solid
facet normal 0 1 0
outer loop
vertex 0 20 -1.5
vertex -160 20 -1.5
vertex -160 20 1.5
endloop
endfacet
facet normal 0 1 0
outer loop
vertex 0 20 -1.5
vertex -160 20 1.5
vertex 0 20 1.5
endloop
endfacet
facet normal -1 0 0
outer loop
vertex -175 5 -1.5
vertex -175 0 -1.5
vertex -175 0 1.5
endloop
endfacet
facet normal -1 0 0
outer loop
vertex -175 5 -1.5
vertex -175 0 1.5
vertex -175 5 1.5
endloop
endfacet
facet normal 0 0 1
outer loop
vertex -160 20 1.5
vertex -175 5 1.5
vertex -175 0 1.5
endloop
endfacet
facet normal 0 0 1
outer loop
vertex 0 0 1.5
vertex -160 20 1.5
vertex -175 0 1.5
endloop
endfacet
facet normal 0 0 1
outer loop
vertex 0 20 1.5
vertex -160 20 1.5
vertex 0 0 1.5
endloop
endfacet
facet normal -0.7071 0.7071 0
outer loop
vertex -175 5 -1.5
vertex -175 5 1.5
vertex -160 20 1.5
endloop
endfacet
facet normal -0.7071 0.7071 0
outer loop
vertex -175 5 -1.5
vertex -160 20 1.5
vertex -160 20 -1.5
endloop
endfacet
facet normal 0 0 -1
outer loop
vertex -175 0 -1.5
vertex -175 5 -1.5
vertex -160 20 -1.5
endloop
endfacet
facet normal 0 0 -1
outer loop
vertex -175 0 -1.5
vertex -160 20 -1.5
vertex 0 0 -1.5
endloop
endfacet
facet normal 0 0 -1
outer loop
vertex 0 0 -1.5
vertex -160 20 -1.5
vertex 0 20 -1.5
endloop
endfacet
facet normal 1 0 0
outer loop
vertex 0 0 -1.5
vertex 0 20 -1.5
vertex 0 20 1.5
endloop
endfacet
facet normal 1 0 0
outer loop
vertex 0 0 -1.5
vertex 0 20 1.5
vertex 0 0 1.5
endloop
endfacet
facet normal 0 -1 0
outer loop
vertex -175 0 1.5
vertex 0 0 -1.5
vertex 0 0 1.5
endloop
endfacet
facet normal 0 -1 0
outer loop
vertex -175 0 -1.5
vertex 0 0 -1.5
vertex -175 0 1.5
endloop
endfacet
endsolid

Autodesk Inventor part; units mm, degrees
ref_plane "YZ Plane" through (0, 0, 0) normal (1, 0, 0) x (0, 1, 0)
ref_plane "XZ Plane" through (0, 0, 0) normal (0, 1, 0) x (-1, 0, 0)
ref_plane "XY Plane" through (0, 0, 0) normal (0, 0, 1) x (1, 0, 0)
sketch "Sketch1" plane through (0, 0, 0) normal (0, 0, 1) x (1, 0, 0)
  line L0 (-175, 20) -> (0, 20)
  line L1 (0, 20) -> (0, 0)
  line L2 (0, 0) -> (-175, 0)
  line L3 (-175, 0) -> (-175, 20)
  dimension "d2" = 20
  dimension "d3" = 175
extrude "Plate1" add sketch "Sketch1" along normal mid plane 3
chamfer "Chamfer1" distance 15 angle 45 1 edges at (-175, 20, 0)
equation "\"d4\" = Thickness"
equation "\"BendReliefWidth\" = Thickness"
equation "\"BendReliefDepth\" = 0.5 * Thickness"
equation "\"CornerReliefSize\" = 4 * Thickness"
equation "\"MinimumRemnant\" = 2 * Thickness"
equation "\"TransitionRadius\" = BendRadius"
equation "\"JacobiRadiusSize\" = BendRadius"
equation "\"GapSize\" = Thickness"
equation "\"Thickness\" = 3"
equation "\"BendRadius\" = 5"
properties part number "MSC 039 flange cover plate 500" material "Stainless Steel"
